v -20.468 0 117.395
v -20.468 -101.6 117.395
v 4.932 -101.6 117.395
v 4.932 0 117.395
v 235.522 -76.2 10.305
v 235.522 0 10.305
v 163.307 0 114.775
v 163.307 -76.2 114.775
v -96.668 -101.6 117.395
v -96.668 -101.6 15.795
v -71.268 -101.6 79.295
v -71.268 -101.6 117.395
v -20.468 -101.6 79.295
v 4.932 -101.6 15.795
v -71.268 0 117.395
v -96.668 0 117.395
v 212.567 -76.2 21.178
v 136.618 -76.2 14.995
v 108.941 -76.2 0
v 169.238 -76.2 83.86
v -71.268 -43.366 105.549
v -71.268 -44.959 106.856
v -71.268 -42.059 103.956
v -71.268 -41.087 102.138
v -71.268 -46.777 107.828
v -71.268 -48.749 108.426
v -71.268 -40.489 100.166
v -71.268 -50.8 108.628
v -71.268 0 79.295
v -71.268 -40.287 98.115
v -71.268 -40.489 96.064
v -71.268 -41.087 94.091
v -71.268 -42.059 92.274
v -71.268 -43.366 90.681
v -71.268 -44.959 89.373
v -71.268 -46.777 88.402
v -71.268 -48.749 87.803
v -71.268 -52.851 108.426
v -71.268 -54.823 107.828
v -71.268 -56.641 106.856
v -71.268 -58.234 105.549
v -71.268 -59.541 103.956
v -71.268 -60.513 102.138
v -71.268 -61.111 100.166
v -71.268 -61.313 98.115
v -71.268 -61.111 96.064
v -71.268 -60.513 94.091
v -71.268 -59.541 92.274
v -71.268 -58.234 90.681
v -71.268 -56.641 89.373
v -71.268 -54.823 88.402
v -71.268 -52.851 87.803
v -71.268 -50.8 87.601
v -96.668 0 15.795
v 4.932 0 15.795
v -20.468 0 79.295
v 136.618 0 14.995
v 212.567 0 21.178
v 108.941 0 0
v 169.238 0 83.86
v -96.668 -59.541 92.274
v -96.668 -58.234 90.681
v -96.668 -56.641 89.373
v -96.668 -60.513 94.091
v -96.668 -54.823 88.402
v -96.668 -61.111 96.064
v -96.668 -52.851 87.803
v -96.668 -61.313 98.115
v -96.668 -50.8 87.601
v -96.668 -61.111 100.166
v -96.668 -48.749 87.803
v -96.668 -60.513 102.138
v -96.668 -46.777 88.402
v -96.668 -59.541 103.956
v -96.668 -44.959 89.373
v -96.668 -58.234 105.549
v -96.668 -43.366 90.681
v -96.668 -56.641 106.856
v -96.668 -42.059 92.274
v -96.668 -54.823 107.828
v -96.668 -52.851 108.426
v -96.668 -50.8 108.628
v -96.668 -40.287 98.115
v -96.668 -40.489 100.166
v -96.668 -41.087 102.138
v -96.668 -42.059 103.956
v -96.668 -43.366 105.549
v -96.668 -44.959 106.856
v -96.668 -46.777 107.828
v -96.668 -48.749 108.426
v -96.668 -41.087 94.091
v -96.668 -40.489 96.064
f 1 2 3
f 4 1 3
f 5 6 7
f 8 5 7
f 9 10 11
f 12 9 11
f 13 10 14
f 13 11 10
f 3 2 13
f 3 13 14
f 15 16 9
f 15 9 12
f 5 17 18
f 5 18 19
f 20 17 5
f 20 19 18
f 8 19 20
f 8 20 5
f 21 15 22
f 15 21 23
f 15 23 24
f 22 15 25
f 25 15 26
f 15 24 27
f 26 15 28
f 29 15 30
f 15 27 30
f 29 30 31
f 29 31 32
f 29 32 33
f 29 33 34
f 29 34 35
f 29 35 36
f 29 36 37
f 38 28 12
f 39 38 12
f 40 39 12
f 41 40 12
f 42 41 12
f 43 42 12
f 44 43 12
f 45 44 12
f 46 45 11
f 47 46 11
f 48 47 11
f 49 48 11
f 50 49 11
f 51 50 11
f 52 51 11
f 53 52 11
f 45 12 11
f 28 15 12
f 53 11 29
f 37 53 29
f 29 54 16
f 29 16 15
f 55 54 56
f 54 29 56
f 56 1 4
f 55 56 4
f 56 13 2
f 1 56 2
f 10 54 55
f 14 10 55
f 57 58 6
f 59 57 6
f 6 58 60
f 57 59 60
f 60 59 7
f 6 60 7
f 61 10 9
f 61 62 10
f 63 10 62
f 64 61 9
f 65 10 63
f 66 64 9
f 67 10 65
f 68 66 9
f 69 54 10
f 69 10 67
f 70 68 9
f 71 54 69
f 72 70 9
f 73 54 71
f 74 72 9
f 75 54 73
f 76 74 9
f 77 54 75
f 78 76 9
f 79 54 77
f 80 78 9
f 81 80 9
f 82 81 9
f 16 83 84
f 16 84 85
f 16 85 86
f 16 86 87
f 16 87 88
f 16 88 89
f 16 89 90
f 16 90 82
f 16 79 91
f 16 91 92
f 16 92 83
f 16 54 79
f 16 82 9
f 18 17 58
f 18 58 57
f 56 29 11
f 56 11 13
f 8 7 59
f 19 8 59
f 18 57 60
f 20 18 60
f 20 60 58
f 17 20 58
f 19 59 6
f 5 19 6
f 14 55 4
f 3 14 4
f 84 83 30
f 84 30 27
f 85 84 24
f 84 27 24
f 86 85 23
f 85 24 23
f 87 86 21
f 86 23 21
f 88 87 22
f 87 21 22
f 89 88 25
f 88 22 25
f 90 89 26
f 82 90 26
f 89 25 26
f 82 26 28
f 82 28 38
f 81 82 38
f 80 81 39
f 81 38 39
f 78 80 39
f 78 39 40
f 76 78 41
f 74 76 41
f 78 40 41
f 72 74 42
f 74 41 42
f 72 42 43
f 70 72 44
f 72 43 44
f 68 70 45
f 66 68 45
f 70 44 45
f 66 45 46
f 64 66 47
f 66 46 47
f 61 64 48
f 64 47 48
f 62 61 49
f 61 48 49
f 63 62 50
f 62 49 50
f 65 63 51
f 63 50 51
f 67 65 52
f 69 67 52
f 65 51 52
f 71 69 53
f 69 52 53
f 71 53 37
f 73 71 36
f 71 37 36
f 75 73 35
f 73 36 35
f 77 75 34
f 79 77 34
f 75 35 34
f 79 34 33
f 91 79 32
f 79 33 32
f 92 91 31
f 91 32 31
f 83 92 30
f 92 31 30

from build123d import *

# Parameters (mm, degrees)
F0_W     = 101.6
F0_H     = 101.6
F1_DEPTH = 101.6
F3_DEPTH = 130.81
F4_R     = 10.513247
F5_DEPTH = 25.4
F7_DEPTH = 76.2
F9_DEPTH = 76.2


with BuildPart() as f1:
    # F0 (on Front) → F1 (new body)
    with BuildSketch(Plane.XZ):
        with Locations((-45.86832, 66.594591)):
            Rectangle(F0_W, F0_H)
    extrude(amount=F1_DEPTH)

    # F2 (on face) → F3 (cut)
    with BuildSketch(Plane.XZ.offset(101.6)):
        Polygon((-71.26832, 117.394591), (-71.26832, 101.119451), (-71.26832, 79.294591), (-20.46832, 79.294591), (-20.46832, 101.119451), (-20.46832, 117.394591), align=None)
    extrude(amount=-F3_DEPTH, mode=Mode.SUBTRACT)

    # F4 (on face) → F5 (cut)
    with BuildSketch(Plane.YZ.offset(-71.26832)):
        with Locations((-50.8, 98.114714)):
            Circle(F4_R)
    extrude(amount=-F5_DEPTH, mode=Mode.SUBTRACT)


with BuildPart() as f7:
    # F6 (on Front) → F7 (new body)
    with BuildSketch(Plane.XZ):
        Polygon((235.521925, 10.304951), (163.306961, 114.775037), (108.940695, 0), align=None)
    extrude(amount=F7_DEPTH)

    # F8 (on face) → F9 (cut)
    with BuildSketch(Plane(origin=(0, 0, 0), x_dir=(-1, 0, 0), z_dir=(0, 1, 0))):
        Polygon((-136.61818, 14.995234), (-169.237939, 83.860256), (-212.566918, 21.178204), align=None)
    extrude(amount=-F9_DEPTH, mode=Mode.SUBTRACT)


solid = Compound([f1.part, f7.part])
